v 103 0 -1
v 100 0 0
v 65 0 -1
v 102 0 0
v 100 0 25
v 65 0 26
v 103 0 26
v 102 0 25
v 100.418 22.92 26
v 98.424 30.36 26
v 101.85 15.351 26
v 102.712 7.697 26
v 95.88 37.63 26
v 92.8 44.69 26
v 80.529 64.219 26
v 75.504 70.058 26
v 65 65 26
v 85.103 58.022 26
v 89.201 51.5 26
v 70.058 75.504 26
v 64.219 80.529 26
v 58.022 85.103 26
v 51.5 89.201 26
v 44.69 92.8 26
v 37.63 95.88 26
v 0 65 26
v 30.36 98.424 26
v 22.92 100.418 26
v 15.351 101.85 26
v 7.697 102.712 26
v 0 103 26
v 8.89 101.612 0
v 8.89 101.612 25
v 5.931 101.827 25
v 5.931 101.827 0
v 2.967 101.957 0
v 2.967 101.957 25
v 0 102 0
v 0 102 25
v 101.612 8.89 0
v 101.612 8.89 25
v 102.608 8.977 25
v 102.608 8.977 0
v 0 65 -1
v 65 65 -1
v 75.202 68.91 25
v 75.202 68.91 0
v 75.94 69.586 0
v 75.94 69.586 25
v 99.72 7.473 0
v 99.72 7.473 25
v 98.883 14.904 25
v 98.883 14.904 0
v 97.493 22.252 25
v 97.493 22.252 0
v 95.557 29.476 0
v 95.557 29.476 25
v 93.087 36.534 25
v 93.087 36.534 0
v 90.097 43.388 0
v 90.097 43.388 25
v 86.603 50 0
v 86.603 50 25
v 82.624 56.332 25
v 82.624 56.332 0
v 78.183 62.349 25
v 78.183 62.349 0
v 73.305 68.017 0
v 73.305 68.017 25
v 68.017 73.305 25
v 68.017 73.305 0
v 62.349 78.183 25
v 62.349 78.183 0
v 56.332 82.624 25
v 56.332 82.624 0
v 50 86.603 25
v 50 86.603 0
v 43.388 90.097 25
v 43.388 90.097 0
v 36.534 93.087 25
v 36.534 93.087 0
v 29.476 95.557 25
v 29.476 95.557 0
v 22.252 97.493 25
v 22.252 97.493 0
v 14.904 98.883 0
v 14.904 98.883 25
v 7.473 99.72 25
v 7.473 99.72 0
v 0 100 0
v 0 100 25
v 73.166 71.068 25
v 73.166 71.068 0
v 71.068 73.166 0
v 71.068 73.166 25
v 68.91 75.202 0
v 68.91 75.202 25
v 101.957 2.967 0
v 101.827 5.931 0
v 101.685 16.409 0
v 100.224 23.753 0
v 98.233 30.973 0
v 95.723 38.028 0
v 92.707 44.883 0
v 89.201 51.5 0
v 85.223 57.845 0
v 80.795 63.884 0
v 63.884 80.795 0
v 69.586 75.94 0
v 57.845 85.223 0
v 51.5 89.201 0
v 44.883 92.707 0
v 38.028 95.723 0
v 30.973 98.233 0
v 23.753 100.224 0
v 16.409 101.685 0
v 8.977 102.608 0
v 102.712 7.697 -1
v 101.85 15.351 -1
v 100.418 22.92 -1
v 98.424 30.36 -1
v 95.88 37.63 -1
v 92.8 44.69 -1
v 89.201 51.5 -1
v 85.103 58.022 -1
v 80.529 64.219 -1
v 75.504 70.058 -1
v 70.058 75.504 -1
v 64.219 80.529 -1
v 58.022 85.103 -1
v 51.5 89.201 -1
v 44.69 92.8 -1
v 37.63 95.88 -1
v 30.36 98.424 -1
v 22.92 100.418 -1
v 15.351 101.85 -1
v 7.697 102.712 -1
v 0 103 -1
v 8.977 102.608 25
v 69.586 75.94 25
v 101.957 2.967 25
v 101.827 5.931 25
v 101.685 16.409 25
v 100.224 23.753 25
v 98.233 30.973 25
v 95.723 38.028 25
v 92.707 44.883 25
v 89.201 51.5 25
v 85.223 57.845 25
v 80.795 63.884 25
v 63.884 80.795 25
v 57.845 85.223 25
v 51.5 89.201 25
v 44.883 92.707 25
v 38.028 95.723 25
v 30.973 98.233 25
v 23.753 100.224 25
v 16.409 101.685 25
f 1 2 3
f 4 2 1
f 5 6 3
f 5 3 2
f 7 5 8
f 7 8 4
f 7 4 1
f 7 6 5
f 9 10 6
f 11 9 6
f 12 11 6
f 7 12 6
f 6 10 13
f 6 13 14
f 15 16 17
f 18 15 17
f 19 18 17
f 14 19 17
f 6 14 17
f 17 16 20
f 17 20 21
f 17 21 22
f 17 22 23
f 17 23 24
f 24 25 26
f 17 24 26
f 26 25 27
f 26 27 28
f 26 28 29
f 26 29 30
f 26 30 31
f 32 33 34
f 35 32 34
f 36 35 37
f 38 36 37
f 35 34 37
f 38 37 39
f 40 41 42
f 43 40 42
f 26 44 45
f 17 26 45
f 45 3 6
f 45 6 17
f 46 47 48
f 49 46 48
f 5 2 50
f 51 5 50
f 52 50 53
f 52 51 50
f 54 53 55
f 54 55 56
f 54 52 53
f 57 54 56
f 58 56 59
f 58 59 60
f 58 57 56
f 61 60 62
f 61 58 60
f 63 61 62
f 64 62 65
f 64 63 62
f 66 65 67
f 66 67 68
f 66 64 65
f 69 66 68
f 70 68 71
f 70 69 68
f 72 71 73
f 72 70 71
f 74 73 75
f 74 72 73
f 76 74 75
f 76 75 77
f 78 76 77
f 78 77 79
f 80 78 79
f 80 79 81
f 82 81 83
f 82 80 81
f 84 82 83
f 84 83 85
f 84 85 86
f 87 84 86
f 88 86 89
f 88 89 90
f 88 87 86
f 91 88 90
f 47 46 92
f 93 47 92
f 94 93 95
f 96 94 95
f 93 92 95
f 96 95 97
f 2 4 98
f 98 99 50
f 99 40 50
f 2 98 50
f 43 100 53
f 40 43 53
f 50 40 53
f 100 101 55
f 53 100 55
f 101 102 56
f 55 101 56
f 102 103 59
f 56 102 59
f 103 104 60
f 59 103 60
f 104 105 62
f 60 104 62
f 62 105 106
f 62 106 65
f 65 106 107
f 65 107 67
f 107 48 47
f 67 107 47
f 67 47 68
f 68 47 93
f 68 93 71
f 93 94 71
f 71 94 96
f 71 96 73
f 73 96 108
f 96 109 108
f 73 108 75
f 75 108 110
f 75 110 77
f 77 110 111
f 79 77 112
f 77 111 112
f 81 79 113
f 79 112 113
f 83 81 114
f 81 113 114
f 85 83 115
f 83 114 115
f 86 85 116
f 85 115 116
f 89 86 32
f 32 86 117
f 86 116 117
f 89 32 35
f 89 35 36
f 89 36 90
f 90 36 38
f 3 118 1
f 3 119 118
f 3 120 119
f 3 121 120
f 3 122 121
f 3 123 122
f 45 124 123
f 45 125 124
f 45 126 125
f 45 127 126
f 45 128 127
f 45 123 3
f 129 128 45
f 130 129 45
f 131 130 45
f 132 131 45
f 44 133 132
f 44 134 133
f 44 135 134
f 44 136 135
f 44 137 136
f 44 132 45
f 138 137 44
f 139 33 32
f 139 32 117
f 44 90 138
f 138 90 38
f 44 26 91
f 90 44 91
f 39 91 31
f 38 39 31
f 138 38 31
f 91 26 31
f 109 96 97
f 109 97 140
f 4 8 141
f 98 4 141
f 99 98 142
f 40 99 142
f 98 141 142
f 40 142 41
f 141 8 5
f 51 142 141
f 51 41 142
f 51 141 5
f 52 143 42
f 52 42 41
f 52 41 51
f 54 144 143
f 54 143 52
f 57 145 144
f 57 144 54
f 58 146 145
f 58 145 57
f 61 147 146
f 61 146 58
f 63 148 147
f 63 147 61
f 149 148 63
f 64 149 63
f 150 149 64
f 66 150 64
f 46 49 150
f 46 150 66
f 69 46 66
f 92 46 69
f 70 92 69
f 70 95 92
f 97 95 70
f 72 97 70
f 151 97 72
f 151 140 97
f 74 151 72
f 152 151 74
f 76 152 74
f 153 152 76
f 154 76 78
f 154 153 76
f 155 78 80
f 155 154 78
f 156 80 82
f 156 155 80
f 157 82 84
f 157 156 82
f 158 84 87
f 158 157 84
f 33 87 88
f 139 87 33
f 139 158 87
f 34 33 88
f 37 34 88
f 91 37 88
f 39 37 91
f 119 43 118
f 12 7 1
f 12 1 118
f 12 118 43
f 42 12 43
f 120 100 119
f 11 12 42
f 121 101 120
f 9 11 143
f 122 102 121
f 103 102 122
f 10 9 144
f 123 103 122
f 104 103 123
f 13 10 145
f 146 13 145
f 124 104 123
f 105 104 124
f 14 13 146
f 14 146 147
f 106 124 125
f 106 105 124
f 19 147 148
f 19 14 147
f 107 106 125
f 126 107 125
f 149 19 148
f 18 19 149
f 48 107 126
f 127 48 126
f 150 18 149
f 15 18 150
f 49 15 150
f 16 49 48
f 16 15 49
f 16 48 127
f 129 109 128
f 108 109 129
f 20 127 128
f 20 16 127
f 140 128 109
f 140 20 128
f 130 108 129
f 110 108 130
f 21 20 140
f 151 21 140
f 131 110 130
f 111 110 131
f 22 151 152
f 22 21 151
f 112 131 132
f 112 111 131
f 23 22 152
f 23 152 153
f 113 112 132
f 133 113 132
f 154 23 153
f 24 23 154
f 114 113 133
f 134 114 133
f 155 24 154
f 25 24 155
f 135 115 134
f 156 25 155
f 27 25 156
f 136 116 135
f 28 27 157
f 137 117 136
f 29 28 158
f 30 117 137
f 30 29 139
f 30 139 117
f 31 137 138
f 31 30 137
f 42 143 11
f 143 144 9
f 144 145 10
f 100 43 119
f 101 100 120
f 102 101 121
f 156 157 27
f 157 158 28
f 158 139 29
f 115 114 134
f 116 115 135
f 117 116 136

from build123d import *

# Parameters (mm, degrees)
CYLINDER008_W          = 102
CYLINDER008_H          = 27
CYLINDER008_ANGLE      = 5
CYLINDER007_W          = 103
CYLINDER007_H          = 27
CYLINDER007_ANGLE      = 5
CUT003_PLACEMENT_ANGLE = 85
CYLINDER004_W          = 102
CYLINDER004_H          = 27
CYLINDER004_ANGLE      = 5
CYLINDER003_W          = 103
CYLINDER003_H          = 27
CYLINDER003_ANGLE      = 5
CYLINDER005_W          = 102
CYLINDER005_H          = 27
CYLINDER005_ANGLE      = 5
CYLINDER006_W          = 103
CYLINDER006_H          = 27
CYLINDER006_ANGLE      = 5
CUT002_PLACEMENT_ANGLE = 42.5
BOX_W                  = 65
BOX_H                  = 65
BOX_DEPTH              = 27
CYLINDER001_W          = 103
CYLINDER001_H          = 1
CYLINDER001_ANGLE      = 90
CYLINDER002_W          = 103
CYLINDER002_H          = 1
CYLINDER002_ANGLE      = 90
CYLINDER_W             = 100
CYLINDER_H             = 25
CYLINDER_ANGLE         = 90


with BuildPart() as zylinder008:
    # Cylinder008 → Cylinder008 (revolve)
    with BuildSketch(Plane(origin=(0, 0, -1), x_dir=(1, 0, 0), z_dir=(0, -1, 0))):
        with Locations((51, 13.5)):
            Rectangle(CYLINDER008_W, CYLINDER008_H)
    revolve(axis=Axis((0, 0, -1), (0, 0, 1)), revolution_arc=CYLINDER008_ANGLE)


with BuildPart() as cut003:
    # Cylinder007 → Cylinder007 (revolve)
    with BuildSketch(Plane(origin=(0, 0, -1), x_dir=(1, 0, 0), z_dir=(0, -1, 0))):
        with Locations((51.5, 13.5)):
            Rectangle(CYLINDER007_W, CYLINDER007_H)
    revolve(axis=Axis((0, 0, -1), (0, 0, 1)), revolution_arc=CYLINDER007_ANGLE)

    # Cut003: cut Zylinder008
    add(zylinder008.part, mode=Mode.SUBTRACT)


with BuildPart() as cut003_1:
    # Cut003 placement: moved
    add(cut003.part.rotate(Axis((0, 0, 0), (0, 0, 1)), CUT003_PLACEMENT_ANGLE))


with BuildPart() as zylinder004:
    # Cylinder004 → Cylinder004 (revolve)
    with BuildSketch(Plane(origin=(0, 0, -1), x_dir=(1, 0, 0), z_dir=(0, -1, 0))):
        with Locations((51, 13.5)):
            Rectangle(CYLINDER004_W, CYLINDER004_H)
    revolve(axis=Axis((0, 0, -1), (0, 0, 1)), revolution_arc=CYLINDER004_ANGLE)


with BuildPart() as cut001:
    # Cylinder003 → Cylinder003 (revolve)
    with BuildSketch(Plane(origin=(0, 0, -1), x_dir=(1, 0, 0), z_dir=(0, -1, 0))):
        with Locations((51.5, 13.5)):
            Rectangle(CYLINDER003_W, CYLINDER003_H)
    revolve(axis=Axis((0, 0, -1), (0, 0, 1)), revolution_arc=CYLINDER003_ANGLE)

    # Cut001: cut Zylinder004
    add(zylinder004.part, mode=Mode.SUBTRACT)


with BuildPart() as zylinder005:
    # Cylinder005 → Cylinder005 (revolve)
    with BuildSketch(Plane(origin=(0, 0, -1), x_dir=(1, 0, 0), z_dir=(0, -1, 0))):
        with Locations((51, 13.5)):
            Rectangle(CYLINDER005_W, CYLINDER005_H)
    revolve(axis=Axis((0, 0, -1), (0, 0, 1)), revolution_arc=CYLINDER005_ANGLE)


with BuildPart() as cut002:
    # Cylinder006 → Cylinder006 (revolve)
    with BuildSketch(Plane(origin=(0, 0, -1), x_dir=(1, 0, 0), z_dir=(0, -1, 0))):
        with Locations((51.5, 13.5)):
            Rectangle(CYLINDER006_W, CYLINDER006_H)
    revolve(axis=Axis((0, 0, -1), (0, 0, 1)), revolution_arc=CYLINDER006_ANGLE)

    # Cut002: cut Zylinder005
    add(zylinder005.part, mode=Mode.SUBTRACT)


with BuildPart() as cut002_1:
    # Cut002 placement: moved
    add(cut002.part.rotate(Axis((0, 0, 0), (0, 0, 1)), CUT002_PLACEMENT_ANGLE))


with BuildPart() as w_rfel:
    # Box → Box (new body)
    with BuildSketch(Plane.XY.offset(-1)):
        with Locations((32.5, 32.5)):
            Rectangle(BOX_W, BOX_H)
    extrude(amount=BOX_DEPTH)


with BuildPart() as zylinder001:
    # Cylinder001 → Cylinder001 (revolve)
    with BuildSketch(Plane(origin=(0, 0, -1), x_dir=(1, 0, 0), z_dir=(0, -1, 0))):
        with Locations((51.5, 0.5)):
            Rectangle(CYLINDER001_W, CYLINDER001_H)
    revolve(axis=Axis((0, 0, -1), (0, 0, 1)), revolution_arc=CYLINDER001_ANGLE)


with BuildPart() as zylinder002:
    # Cylinder002 → Cylinder002 (revolve)
    with BuildSketch(Plane(origin=(0, 0, 25), x_dir=(1, 0, 0), z_dir=(0, -1, 0))):
        with Locations((51.5, 0.5)):
            Rectangle(CYLINDER002_W, CYLINDER002_H)
    revolve(axis=Axis((0, 0, 25), (0, 0, 1)), revolution_arc=CYLINDER002_ANGLE)


with BuildPart() as fusion001:
    # Cylinder → Cylinder (revolve)
    with BuildSketch(Plane.XZ):
        with Locations((50, 12.5)):
            Rectangle(CYLINDER_W, CYLINDER_H)
    revolve(axis=Axis((0, 0, 0), (0, 0, 1)), revolution_arc=CYLINDER_ANGLE)

    # Fusion: union Zylinder001, Zylinder002
    add(zylinder001.part)
    add(zylinder002.part)

    # Cut: cut Würfel
    add(w_rfel.part, mode=Mode.SUBTRACT)

    # Fusion001: union Cut003, Cut001, Cut002
    add(cut003_1.part)
    add(cut001.part)
    add(cut002_1.part)


solid = fusion001.part
